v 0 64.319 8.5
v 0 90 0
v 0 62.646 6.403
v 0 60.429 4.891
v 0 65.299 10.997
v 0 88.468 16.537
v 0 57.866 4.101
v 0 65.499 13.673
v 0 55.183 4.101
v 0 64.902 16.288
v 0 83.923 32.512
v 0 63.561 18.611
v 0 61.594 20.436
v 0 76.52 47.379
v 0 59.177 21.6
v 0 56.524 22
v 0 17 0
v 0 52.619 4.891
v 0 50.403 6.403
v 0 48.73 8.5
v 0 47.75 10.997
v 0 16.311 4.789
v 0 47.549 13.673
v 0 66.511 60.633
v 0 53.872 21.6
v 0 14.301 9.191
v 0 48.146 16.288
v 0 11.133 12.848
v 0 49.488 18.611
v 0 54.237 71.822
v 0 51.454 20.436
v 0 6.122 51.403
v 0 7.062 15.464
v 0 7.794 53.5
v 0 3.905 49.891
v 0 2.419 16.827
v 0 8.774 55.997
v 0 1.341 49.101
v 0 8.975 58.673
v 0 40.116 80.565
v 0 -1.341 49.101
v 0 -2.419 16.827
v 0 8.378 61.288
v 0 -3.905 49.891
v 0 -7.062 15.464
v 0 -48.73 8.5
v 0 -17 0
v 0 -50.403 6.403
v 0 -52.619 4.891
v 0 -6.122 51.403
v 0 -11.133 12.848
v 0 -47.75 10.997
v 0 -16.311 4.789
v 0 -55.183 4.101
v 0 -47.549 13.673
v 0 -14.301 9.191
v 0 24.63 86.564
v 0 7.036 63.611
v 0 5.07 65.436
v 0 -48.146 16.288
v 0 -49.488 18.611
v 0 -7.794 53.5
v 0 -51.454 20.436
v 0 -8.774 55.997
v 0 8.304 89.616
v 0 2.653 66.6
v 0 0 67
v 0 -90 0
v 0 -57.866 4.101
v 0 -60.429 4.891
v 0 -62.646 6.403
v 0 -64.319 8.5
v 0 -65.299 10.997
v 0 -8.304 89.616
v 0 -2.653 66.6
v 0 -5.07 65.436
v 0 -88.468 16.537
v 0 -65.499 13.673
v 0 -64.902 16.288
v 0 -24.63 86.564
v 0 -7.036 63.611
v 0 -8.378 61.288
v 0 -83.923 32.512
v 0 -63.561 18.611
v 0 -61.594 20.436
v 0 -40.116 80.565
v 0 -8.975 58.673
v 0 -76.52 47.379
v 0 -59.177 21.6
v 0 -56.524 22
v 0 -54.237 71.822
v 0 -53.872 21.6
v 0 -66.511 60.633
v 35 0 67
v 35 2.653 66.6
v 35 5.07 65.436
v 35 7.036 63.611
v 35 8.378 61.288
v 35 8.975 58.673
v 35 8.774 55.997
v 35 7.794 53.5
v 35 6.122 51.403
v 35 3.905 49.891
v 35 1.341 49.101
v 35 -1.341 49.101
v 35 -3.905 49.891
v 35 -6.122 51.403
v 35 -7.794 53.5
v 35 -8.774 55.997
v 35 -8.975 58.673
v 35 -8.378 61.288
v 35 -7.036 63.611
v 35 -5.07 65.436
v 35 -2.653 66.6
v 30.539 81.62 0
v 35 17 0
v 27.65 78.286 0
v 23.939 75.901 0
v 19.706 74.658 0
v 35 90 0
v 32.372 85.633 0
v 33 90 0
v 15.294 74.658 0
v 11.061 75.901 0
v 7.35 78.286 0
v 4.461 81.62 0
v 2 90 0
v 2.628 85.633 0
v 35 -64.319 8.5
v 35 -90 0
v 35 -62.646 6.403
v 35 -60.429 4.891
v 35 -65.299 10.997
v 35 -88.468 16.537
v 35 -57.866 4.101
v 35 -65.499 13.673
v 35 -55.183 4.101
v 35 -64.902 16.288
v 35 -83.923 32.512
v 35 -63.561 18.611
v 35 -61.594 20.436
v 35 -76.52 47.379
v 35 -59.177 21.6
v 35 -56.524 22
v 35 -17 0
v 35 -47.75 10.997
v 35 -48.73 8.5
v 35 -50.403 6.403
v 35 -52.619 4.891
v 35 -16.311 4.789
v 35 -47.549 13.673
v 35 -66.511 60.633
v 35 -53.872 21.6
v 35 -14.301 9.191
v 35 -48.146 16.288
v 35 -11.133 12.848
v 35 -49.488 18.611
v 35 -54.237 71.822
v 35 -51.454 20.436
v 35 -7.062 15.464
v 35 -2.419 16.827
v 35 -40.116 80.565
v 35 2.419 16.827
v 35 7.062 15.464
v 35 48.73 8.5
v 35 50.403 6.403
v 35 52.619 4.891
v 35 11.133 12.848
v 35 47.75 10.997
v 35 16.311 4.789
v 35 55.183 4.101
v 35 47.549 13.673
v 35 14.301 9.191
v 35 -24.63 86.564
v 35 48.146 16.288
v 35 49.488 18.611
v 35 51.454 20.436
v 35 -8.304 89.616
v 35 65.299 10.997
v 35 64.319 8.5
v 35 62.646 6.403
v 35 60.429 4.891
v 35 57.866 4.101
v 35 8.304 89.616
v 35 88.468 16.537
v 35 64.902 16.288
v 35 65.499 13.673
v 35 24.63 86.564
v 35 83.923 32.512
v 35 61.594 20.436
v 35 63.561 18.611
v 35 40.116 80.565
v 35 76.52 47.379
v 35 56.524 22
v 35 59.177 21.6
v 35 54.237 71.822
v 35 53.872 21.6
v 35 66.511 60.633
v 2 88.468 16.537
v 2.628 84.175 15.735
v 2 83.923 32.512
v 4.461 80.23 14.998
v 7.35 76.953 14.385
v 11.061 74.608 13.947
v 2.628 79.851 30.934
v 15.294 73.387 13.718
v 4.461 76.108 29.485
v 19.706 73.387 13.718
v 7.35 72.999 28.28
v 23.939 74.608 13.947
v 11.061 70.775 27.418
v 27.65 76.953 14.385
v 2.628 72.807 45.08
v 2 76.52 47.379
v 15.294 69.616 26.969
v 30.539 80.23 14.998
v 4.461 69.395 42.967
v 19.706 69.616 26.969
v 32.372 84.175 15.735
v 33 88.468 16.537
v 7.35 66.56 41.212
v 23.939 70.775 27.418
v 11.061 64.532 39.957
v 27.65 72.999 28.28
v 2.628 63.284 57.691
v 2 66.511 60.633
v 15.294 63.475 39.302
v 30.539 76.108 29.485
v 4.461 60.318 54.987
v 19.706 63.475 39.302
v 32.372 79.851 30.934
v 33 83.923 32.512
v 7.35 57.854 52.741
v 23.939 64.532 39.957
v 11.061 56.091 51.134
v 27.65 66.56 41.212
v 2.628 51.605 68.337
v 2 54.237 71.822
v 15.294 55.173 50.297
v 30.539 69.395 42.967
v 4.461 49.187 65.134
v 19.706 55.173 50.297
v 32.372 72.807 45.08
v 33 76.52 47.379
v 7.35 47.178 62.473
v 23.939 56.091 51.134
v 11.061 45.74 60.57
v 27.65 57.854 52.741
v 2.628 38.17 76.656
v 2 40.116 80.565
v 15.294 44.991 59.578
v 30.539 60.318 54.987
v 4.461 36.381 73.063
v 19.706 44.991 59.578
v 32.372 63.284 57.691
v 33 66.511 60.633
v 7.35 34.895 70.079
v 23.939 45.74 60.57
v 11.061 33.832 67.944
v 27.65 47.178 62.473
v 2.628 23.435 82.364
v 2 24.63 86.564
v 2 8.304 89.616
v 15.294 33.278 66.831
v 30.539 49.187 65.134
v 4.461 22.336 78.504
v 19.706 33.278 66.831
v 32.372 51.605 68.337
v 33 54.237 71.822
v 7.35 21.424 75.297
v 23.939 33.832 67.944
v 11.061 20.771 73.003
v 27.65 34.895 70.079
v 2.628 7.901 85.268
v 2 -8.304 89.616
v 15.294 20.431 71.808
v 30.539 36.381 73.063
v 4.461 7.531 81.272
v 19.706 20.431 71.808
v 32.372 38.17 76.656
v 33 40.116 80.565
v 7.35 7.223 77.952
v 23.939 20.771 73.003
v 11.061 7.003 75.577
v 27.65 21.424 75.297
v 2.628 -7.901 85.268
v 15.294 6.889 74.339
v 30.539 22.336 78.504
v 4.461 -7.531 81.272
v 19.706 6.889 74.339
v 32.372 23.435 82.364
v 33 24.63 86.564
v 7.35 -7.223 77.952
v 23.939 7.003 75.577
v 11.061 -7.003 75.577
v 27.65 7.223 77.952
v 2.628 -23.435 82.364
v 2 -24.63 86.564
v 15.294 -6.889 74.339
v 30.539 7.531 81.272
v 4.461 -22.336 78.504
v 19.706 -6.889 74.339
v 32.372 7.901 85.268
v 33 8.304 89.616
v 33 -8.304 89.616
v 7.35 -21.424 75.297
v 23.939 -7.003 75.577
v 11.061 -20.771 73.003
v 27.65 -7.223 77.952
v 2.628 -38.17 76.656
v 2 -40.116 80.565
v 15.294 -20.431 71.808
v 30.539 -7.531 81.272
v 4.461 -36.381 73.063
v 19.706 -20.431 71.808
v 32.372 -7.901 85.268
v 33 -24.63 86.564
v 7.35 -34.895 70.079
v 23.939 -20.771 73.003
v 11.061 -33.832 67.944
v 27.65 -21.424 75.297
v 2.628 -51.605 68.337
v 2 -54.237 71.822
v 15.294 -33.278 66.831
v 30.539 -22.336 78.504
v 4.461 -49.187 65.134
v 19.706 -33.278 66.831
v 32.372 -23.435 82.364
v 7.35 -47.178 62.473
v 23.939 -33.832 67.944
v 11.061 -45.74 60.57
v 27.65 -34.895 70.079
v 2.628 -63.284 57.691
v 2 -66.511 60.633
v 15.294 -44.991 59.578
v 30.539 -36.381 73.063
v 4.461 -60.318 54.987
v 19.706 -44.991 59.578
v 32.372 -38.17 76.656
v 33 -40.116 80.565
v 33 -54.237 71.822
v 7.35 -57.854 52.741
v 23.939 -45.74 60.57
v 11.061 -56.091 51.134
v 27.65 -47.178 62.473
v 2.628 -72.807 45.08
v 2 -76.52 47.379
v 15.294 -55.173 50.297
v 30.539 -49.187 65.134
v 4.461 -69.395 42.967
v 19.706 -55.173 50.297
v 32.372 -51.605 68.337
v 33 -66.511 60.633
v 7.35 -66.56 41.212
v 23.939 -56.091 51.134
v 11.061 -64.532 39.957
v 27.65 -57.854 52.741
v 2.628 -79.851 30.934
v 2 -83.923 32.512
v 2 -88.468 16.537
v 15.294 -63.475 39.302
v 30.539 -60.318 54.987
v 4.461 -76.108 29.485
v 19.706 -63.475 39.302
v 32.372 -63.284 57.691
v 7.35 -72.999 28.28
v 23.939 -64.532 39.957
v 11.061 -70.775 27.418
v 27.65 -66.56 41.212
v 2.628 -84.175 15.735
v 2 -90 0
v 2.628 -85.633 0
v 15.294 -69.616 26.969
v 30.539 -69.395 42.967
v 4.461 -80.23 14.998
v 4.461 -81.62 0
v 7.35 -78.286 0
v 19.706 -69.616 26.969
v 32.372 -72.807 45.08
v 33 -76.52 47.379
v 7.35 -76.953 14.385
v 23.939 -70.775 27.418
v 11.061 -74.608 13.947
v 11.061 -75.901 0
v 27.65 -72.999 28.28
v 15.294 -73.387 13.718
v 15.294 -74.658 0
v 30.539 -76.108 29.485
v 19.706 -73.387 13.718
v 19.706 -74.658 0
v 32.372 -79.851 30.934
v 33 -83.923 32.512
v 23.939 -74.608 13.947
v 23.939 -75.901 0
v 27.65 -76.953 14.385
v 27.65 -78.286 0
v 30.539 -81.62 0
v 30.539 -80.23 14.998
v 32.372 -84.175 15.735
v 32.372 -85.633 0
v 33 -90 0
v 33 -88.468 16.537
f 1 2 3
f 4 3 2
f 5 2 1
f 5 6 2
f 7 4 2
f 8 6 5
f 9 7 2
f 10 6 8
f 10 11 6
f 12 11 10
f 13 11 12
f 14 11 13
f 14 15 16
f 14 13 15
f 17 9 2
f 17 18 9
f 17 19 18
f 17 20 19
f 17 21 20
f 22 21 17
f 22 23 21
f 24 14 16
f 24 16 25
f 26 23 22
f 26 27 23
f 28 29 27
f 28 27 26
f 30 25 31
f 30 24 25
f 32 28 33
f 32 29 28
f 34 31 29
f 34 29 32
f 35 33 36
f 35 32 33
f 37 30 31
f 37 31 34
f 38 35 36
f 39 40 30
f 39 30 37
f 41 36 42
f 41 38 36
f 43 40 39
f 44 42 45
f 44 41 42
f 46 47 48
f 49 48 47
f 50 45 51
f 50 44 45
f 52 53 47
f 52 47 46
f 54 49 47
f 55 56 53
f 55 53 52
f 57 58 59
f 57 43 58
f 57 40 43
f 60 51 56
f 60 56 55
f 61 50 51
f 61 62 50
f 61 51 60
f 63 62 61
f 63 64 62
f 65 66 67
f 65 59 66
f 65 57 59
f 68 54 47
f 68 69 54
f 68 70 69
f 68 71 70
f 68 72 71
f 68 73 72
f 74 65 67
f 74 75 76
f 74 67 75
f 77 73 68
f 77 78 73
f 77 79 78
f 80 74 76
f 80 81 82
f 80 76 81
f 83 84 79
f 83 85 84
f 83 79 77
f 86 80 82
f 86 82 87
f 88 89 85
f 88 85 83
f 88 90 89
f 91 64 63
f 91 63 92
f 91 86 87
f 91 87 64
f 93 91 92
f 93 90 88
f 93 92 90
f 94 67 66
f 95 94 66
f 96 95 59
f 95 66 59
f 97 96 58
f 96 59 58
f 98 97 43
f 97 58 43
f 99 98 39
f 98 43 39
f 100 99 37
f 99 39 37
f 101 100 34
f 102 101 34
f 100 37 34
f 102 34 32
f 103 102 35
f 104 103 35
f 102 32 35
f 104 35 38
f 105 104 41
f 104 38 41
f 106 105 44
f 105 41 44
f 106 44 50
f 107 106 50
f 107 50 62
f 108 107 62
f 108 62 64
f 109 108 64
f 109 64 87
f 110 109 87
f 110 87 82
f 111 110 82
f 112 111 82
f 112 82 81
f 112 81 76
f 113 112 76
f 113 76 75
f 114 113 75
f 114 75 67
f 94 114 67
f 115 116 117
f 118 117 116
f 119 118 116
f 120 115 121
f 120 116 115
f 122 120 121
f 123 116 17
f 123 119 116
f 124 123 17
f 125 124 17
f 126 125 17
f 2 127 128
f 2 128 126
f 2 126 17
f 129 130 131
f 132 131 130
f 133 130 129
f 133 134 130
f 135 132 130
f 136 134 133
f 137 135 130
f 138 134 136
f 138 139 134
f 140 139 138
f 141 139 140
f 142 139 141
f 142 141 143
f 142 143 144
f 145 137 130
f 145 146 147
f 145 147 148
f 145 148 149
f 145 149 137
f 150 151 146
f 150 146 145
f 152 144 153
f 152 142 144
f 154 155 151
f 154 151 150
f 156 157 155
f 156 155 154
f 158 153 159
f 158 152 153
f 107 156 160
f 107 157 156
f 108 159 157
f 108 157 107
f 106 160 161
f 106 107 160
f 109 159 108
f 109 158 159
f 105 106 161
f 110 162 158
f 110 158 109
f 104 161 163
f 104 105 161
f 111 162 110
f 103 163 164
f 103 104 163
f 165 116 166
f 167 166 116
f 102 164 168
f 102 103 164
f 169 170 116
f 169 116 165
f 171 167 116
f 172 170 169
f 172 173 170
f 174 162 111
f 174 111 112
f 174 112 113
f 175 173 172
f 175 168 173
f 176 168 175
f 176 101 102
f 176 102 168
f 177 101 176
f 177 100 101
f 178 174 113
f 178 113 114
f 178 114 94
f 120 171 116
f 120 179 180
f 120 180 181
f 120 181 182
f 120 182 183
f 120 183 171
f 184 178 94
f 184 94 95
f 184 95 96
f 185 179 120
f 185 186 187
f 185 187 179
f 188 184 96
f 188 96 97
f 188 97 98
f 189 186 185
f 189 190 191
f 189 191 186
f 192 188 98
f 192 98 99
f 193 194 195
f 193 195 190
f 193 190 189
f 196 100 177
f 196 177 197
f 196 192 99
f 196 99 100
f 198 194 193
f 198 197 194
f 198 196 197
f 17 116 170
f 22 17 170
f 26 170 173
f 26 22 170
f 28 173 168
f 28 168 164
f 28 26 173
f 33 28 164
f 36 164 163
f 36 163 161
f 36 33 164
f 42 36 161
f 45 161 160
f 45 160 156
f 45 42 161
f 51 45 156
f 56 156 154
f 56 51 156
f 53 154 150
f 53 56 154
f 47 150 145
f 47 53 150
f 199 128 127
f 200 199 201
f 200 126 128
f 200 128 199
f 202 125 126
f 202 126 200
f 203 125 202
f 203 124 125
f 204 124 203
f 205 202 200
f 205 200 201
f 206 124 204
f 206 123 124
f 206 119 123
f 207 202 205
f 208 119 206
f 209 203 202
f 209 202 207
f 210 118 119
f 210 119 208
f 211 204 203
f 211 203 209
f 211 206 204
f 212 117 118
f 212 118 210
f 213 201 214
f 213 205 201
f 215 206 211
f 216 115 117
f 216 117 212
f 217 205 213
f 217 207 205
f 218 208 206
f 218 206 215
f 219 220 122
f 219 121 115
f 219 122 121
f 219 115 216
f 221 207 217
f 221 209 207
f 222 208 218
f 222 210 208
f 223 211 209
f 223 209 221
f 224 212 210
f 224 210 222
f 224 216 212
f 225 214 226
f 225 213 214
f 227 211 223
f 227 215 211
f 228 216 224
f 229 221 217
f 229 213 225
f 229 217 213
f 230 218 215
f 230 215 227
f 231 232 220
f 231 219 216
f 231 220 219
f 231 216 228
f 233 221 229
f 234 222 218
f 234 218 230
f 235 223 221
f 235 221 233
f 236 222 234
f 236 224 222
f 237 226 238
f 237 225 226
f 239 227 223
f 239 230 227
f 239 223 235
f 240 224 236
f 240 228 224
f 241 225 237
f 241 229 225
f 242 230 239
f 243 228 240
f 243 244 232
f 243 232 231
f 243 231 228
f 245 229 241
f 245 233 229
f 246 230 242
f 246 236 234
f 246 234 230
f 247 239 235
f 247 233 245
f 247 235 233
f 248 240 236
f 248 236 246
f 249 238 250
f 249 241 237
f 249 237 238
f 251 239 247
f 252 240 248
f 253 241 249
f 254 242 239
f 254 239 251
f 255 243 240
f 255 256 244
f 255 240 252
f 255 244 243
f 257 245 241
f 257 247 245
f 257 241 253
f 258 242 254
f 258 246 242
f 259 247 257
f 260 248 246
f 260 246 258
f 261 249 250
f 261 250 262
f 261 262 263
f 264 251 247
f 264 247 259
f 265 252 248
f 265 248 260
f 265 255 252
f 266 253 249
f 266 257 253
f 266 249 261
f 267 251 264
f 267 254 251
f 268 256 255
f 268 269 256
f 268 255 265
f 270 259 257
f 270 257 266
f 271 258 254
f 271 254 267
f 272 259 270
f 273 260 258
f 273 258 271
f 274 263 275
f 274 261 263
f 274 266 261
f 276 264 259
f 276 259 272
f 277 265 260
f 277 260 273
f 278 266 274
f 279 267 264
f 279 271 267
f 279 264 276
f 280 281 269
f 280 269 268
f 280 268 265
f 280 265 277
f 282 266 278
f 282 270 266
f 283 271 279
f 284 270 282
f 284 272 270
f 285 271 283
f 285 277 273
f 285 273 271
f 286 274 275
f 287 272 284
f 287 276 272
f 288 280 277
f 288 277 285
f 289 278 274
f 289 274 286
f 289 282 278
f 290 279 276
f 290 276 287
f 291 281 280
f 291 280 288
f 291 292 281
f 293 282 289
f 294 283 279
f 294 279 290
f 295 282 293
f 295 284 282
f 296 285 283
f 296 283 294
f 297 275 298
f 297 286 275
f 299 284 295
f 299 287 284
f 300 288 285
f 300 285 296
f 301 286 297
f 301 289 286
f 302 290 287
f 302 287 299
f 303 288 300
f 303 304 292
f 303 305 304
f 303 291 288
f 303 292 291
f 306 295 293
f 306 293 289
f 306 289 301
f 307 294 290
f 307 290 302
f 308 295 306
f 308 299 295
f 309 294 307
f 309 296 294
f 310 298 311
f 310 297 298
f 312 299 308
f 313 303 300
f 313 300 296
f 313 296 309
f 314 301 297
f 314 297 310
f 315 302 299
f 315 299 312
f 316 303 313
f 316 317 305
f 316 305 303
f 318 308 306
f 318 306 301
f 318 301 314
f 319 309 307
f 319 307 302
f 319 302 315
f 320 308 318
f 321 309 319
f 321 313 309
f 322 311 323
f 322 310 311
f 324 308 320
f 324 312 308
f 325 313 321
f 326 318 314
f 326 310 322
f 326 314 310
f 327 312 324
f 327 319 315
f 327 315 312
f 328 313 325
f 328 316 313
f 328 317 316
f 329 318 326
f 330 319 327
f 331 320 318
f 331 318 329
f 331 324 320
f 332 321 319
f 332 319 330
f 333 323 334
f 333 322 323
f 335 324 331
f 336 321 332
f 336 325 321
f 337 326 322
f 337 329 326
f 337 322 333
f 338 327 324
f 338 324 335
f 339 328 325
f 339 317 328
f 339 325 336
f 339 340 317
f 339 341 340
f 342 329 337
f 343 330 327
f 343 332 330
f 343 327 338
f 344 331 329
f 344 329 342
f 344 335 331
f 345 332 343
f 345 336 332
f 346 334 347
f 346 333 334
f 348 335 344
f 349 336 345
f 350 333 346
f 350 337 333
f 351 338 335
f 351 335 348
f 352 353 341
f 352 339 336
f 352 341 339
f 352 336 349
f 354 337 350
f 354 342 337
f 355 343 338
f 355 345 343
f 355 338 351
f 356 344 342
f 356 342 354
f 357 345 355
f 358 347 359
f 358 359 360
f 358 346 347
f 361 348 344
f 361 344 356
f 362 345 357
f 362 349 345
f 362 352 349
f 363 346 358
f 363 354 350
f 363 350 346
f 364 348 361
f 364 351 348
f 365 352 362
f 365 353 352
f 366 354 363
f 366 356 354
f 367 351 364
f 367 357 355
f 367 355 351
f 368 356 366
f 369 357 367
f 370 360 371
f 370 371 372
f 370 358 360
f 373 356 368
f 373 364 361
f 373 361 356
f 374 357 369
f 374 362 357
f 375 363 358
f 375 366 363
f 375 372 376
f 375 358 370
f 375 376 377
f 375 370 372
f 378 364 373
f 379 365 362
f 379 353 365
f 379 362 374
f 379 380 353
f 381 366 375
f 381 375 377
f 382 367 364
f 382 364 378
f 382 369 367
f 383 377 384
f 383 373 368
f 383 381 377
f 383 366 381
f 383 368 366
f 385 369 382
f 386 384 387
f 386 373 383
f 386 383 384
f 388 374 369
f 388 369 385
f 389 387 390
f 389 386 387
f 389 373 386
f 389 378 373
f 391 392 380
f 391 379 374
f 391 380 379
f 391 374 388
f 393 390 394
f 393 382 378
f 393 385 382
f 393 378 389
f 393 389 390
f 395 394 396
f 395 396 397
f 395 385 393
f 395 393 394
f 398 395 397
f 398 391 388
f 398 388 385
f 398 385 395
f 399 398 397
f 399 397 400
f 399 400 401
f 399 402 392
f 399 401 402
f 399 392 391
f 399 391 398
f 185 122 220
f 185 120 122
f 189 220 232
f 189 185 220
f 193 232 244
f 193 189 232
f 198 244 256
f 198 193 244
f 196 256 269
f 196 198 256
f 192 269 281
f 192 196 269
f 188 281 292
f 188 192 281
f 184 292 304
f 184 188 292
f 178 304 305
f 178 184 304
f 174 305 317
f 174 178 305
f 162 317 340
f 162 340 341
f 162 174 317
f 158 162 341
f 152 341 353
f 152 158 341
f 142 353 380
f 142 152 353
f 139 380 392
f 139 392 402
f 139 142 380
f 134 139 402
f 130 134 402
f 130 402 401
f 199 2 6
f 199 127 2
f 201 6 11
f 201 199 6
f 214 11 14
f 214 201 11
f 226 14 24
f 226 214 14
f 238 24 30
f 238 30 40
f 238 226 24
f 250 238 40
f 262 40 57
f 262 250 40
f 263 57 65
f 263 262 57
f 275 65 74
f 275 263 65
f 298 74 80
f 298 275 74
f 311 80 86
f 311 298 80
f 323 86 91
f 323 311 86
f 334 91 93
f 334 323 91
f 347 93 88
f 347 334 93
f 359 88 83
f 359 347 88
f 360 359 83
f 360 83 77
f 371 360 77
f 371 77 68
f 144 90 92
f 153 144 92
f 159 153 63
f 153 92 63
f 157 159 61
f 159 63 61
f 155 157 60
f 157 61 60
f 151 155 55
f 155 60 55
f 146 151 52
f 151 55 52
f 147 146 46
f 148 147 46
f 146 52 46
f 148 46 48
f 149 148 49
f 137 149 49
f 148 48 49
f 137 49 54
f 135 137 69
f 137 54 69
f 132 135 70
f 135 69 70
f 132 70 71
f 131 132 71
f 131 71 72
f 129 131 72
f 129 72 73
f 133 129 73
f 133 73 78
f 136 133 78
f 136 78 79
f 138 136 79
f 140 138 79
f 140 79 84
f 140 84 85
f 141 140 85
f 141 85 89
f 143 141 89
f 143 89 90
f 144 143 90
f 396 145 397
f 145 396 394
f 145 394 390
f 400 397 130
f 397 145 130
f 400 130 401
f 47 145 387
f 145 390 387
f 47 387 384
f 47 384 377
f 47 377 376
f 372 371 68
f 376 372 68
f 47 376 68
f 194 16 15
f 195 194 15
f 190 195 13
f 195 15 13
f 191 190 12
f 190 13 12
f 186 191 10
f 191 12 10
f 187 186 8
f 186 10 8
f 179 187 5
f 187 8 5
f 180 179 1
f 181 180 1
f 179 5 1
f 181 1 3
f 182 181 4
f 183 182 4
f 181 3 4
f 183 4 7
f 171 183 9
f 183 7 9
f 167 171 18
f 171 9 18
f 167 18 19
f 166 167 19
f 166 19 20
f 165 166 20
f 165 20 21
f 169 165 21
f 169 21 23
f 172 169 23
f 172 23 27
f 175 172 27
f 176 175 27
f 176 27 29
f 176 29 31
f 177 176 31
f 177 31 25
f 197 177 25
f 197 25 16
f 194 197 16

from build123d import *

# Parameters (mm, degrees)
R_VOLUTION1_ANGLE       = 180
ESQUISSE2_R             = 9
ENL_V_MAT_EXTRU_1_DEPTH = 36


with BuildPart() as part:
    # Esquisse1 → Révolution1 (revolve)
    with BuildSketch(Plane.XY):
        with BuildLine():
            Line((0, 17), (0, 90))
            Line((0, 90), (2, 90))
            ThreePointArc((2, 90), (17.5, 74.5), (33, 90))
            Line((33, 90), (35, 90))
            Line((35, 90), (35, 17))
            Line((35, 17), (0, 17))
        make_face()
    revolve(axis=Axis((0, 0, 0), (1, 0, 0)), revolution_arc=R_VOLUTION1_ANGLE)

    # Esquisse2 → Enlèv. mat.-Extru.1 (cut, through all)
    with BuildSketch(Plane.ZY):
        with Locations((13, -56.524331044)):
            Circle(ESQUISSE2_R)
        with Locations((58, 0)):
            Circle(ESQUISSE2_R)
        with Locations((13, 56.524331044)):
            Circle(ESQUISSE2_R)
    extrude(amount=-ENL_V_MAT_EXTRU_1_DEPTH, mode=Mode.SUBTRACT)


solid = part.part
